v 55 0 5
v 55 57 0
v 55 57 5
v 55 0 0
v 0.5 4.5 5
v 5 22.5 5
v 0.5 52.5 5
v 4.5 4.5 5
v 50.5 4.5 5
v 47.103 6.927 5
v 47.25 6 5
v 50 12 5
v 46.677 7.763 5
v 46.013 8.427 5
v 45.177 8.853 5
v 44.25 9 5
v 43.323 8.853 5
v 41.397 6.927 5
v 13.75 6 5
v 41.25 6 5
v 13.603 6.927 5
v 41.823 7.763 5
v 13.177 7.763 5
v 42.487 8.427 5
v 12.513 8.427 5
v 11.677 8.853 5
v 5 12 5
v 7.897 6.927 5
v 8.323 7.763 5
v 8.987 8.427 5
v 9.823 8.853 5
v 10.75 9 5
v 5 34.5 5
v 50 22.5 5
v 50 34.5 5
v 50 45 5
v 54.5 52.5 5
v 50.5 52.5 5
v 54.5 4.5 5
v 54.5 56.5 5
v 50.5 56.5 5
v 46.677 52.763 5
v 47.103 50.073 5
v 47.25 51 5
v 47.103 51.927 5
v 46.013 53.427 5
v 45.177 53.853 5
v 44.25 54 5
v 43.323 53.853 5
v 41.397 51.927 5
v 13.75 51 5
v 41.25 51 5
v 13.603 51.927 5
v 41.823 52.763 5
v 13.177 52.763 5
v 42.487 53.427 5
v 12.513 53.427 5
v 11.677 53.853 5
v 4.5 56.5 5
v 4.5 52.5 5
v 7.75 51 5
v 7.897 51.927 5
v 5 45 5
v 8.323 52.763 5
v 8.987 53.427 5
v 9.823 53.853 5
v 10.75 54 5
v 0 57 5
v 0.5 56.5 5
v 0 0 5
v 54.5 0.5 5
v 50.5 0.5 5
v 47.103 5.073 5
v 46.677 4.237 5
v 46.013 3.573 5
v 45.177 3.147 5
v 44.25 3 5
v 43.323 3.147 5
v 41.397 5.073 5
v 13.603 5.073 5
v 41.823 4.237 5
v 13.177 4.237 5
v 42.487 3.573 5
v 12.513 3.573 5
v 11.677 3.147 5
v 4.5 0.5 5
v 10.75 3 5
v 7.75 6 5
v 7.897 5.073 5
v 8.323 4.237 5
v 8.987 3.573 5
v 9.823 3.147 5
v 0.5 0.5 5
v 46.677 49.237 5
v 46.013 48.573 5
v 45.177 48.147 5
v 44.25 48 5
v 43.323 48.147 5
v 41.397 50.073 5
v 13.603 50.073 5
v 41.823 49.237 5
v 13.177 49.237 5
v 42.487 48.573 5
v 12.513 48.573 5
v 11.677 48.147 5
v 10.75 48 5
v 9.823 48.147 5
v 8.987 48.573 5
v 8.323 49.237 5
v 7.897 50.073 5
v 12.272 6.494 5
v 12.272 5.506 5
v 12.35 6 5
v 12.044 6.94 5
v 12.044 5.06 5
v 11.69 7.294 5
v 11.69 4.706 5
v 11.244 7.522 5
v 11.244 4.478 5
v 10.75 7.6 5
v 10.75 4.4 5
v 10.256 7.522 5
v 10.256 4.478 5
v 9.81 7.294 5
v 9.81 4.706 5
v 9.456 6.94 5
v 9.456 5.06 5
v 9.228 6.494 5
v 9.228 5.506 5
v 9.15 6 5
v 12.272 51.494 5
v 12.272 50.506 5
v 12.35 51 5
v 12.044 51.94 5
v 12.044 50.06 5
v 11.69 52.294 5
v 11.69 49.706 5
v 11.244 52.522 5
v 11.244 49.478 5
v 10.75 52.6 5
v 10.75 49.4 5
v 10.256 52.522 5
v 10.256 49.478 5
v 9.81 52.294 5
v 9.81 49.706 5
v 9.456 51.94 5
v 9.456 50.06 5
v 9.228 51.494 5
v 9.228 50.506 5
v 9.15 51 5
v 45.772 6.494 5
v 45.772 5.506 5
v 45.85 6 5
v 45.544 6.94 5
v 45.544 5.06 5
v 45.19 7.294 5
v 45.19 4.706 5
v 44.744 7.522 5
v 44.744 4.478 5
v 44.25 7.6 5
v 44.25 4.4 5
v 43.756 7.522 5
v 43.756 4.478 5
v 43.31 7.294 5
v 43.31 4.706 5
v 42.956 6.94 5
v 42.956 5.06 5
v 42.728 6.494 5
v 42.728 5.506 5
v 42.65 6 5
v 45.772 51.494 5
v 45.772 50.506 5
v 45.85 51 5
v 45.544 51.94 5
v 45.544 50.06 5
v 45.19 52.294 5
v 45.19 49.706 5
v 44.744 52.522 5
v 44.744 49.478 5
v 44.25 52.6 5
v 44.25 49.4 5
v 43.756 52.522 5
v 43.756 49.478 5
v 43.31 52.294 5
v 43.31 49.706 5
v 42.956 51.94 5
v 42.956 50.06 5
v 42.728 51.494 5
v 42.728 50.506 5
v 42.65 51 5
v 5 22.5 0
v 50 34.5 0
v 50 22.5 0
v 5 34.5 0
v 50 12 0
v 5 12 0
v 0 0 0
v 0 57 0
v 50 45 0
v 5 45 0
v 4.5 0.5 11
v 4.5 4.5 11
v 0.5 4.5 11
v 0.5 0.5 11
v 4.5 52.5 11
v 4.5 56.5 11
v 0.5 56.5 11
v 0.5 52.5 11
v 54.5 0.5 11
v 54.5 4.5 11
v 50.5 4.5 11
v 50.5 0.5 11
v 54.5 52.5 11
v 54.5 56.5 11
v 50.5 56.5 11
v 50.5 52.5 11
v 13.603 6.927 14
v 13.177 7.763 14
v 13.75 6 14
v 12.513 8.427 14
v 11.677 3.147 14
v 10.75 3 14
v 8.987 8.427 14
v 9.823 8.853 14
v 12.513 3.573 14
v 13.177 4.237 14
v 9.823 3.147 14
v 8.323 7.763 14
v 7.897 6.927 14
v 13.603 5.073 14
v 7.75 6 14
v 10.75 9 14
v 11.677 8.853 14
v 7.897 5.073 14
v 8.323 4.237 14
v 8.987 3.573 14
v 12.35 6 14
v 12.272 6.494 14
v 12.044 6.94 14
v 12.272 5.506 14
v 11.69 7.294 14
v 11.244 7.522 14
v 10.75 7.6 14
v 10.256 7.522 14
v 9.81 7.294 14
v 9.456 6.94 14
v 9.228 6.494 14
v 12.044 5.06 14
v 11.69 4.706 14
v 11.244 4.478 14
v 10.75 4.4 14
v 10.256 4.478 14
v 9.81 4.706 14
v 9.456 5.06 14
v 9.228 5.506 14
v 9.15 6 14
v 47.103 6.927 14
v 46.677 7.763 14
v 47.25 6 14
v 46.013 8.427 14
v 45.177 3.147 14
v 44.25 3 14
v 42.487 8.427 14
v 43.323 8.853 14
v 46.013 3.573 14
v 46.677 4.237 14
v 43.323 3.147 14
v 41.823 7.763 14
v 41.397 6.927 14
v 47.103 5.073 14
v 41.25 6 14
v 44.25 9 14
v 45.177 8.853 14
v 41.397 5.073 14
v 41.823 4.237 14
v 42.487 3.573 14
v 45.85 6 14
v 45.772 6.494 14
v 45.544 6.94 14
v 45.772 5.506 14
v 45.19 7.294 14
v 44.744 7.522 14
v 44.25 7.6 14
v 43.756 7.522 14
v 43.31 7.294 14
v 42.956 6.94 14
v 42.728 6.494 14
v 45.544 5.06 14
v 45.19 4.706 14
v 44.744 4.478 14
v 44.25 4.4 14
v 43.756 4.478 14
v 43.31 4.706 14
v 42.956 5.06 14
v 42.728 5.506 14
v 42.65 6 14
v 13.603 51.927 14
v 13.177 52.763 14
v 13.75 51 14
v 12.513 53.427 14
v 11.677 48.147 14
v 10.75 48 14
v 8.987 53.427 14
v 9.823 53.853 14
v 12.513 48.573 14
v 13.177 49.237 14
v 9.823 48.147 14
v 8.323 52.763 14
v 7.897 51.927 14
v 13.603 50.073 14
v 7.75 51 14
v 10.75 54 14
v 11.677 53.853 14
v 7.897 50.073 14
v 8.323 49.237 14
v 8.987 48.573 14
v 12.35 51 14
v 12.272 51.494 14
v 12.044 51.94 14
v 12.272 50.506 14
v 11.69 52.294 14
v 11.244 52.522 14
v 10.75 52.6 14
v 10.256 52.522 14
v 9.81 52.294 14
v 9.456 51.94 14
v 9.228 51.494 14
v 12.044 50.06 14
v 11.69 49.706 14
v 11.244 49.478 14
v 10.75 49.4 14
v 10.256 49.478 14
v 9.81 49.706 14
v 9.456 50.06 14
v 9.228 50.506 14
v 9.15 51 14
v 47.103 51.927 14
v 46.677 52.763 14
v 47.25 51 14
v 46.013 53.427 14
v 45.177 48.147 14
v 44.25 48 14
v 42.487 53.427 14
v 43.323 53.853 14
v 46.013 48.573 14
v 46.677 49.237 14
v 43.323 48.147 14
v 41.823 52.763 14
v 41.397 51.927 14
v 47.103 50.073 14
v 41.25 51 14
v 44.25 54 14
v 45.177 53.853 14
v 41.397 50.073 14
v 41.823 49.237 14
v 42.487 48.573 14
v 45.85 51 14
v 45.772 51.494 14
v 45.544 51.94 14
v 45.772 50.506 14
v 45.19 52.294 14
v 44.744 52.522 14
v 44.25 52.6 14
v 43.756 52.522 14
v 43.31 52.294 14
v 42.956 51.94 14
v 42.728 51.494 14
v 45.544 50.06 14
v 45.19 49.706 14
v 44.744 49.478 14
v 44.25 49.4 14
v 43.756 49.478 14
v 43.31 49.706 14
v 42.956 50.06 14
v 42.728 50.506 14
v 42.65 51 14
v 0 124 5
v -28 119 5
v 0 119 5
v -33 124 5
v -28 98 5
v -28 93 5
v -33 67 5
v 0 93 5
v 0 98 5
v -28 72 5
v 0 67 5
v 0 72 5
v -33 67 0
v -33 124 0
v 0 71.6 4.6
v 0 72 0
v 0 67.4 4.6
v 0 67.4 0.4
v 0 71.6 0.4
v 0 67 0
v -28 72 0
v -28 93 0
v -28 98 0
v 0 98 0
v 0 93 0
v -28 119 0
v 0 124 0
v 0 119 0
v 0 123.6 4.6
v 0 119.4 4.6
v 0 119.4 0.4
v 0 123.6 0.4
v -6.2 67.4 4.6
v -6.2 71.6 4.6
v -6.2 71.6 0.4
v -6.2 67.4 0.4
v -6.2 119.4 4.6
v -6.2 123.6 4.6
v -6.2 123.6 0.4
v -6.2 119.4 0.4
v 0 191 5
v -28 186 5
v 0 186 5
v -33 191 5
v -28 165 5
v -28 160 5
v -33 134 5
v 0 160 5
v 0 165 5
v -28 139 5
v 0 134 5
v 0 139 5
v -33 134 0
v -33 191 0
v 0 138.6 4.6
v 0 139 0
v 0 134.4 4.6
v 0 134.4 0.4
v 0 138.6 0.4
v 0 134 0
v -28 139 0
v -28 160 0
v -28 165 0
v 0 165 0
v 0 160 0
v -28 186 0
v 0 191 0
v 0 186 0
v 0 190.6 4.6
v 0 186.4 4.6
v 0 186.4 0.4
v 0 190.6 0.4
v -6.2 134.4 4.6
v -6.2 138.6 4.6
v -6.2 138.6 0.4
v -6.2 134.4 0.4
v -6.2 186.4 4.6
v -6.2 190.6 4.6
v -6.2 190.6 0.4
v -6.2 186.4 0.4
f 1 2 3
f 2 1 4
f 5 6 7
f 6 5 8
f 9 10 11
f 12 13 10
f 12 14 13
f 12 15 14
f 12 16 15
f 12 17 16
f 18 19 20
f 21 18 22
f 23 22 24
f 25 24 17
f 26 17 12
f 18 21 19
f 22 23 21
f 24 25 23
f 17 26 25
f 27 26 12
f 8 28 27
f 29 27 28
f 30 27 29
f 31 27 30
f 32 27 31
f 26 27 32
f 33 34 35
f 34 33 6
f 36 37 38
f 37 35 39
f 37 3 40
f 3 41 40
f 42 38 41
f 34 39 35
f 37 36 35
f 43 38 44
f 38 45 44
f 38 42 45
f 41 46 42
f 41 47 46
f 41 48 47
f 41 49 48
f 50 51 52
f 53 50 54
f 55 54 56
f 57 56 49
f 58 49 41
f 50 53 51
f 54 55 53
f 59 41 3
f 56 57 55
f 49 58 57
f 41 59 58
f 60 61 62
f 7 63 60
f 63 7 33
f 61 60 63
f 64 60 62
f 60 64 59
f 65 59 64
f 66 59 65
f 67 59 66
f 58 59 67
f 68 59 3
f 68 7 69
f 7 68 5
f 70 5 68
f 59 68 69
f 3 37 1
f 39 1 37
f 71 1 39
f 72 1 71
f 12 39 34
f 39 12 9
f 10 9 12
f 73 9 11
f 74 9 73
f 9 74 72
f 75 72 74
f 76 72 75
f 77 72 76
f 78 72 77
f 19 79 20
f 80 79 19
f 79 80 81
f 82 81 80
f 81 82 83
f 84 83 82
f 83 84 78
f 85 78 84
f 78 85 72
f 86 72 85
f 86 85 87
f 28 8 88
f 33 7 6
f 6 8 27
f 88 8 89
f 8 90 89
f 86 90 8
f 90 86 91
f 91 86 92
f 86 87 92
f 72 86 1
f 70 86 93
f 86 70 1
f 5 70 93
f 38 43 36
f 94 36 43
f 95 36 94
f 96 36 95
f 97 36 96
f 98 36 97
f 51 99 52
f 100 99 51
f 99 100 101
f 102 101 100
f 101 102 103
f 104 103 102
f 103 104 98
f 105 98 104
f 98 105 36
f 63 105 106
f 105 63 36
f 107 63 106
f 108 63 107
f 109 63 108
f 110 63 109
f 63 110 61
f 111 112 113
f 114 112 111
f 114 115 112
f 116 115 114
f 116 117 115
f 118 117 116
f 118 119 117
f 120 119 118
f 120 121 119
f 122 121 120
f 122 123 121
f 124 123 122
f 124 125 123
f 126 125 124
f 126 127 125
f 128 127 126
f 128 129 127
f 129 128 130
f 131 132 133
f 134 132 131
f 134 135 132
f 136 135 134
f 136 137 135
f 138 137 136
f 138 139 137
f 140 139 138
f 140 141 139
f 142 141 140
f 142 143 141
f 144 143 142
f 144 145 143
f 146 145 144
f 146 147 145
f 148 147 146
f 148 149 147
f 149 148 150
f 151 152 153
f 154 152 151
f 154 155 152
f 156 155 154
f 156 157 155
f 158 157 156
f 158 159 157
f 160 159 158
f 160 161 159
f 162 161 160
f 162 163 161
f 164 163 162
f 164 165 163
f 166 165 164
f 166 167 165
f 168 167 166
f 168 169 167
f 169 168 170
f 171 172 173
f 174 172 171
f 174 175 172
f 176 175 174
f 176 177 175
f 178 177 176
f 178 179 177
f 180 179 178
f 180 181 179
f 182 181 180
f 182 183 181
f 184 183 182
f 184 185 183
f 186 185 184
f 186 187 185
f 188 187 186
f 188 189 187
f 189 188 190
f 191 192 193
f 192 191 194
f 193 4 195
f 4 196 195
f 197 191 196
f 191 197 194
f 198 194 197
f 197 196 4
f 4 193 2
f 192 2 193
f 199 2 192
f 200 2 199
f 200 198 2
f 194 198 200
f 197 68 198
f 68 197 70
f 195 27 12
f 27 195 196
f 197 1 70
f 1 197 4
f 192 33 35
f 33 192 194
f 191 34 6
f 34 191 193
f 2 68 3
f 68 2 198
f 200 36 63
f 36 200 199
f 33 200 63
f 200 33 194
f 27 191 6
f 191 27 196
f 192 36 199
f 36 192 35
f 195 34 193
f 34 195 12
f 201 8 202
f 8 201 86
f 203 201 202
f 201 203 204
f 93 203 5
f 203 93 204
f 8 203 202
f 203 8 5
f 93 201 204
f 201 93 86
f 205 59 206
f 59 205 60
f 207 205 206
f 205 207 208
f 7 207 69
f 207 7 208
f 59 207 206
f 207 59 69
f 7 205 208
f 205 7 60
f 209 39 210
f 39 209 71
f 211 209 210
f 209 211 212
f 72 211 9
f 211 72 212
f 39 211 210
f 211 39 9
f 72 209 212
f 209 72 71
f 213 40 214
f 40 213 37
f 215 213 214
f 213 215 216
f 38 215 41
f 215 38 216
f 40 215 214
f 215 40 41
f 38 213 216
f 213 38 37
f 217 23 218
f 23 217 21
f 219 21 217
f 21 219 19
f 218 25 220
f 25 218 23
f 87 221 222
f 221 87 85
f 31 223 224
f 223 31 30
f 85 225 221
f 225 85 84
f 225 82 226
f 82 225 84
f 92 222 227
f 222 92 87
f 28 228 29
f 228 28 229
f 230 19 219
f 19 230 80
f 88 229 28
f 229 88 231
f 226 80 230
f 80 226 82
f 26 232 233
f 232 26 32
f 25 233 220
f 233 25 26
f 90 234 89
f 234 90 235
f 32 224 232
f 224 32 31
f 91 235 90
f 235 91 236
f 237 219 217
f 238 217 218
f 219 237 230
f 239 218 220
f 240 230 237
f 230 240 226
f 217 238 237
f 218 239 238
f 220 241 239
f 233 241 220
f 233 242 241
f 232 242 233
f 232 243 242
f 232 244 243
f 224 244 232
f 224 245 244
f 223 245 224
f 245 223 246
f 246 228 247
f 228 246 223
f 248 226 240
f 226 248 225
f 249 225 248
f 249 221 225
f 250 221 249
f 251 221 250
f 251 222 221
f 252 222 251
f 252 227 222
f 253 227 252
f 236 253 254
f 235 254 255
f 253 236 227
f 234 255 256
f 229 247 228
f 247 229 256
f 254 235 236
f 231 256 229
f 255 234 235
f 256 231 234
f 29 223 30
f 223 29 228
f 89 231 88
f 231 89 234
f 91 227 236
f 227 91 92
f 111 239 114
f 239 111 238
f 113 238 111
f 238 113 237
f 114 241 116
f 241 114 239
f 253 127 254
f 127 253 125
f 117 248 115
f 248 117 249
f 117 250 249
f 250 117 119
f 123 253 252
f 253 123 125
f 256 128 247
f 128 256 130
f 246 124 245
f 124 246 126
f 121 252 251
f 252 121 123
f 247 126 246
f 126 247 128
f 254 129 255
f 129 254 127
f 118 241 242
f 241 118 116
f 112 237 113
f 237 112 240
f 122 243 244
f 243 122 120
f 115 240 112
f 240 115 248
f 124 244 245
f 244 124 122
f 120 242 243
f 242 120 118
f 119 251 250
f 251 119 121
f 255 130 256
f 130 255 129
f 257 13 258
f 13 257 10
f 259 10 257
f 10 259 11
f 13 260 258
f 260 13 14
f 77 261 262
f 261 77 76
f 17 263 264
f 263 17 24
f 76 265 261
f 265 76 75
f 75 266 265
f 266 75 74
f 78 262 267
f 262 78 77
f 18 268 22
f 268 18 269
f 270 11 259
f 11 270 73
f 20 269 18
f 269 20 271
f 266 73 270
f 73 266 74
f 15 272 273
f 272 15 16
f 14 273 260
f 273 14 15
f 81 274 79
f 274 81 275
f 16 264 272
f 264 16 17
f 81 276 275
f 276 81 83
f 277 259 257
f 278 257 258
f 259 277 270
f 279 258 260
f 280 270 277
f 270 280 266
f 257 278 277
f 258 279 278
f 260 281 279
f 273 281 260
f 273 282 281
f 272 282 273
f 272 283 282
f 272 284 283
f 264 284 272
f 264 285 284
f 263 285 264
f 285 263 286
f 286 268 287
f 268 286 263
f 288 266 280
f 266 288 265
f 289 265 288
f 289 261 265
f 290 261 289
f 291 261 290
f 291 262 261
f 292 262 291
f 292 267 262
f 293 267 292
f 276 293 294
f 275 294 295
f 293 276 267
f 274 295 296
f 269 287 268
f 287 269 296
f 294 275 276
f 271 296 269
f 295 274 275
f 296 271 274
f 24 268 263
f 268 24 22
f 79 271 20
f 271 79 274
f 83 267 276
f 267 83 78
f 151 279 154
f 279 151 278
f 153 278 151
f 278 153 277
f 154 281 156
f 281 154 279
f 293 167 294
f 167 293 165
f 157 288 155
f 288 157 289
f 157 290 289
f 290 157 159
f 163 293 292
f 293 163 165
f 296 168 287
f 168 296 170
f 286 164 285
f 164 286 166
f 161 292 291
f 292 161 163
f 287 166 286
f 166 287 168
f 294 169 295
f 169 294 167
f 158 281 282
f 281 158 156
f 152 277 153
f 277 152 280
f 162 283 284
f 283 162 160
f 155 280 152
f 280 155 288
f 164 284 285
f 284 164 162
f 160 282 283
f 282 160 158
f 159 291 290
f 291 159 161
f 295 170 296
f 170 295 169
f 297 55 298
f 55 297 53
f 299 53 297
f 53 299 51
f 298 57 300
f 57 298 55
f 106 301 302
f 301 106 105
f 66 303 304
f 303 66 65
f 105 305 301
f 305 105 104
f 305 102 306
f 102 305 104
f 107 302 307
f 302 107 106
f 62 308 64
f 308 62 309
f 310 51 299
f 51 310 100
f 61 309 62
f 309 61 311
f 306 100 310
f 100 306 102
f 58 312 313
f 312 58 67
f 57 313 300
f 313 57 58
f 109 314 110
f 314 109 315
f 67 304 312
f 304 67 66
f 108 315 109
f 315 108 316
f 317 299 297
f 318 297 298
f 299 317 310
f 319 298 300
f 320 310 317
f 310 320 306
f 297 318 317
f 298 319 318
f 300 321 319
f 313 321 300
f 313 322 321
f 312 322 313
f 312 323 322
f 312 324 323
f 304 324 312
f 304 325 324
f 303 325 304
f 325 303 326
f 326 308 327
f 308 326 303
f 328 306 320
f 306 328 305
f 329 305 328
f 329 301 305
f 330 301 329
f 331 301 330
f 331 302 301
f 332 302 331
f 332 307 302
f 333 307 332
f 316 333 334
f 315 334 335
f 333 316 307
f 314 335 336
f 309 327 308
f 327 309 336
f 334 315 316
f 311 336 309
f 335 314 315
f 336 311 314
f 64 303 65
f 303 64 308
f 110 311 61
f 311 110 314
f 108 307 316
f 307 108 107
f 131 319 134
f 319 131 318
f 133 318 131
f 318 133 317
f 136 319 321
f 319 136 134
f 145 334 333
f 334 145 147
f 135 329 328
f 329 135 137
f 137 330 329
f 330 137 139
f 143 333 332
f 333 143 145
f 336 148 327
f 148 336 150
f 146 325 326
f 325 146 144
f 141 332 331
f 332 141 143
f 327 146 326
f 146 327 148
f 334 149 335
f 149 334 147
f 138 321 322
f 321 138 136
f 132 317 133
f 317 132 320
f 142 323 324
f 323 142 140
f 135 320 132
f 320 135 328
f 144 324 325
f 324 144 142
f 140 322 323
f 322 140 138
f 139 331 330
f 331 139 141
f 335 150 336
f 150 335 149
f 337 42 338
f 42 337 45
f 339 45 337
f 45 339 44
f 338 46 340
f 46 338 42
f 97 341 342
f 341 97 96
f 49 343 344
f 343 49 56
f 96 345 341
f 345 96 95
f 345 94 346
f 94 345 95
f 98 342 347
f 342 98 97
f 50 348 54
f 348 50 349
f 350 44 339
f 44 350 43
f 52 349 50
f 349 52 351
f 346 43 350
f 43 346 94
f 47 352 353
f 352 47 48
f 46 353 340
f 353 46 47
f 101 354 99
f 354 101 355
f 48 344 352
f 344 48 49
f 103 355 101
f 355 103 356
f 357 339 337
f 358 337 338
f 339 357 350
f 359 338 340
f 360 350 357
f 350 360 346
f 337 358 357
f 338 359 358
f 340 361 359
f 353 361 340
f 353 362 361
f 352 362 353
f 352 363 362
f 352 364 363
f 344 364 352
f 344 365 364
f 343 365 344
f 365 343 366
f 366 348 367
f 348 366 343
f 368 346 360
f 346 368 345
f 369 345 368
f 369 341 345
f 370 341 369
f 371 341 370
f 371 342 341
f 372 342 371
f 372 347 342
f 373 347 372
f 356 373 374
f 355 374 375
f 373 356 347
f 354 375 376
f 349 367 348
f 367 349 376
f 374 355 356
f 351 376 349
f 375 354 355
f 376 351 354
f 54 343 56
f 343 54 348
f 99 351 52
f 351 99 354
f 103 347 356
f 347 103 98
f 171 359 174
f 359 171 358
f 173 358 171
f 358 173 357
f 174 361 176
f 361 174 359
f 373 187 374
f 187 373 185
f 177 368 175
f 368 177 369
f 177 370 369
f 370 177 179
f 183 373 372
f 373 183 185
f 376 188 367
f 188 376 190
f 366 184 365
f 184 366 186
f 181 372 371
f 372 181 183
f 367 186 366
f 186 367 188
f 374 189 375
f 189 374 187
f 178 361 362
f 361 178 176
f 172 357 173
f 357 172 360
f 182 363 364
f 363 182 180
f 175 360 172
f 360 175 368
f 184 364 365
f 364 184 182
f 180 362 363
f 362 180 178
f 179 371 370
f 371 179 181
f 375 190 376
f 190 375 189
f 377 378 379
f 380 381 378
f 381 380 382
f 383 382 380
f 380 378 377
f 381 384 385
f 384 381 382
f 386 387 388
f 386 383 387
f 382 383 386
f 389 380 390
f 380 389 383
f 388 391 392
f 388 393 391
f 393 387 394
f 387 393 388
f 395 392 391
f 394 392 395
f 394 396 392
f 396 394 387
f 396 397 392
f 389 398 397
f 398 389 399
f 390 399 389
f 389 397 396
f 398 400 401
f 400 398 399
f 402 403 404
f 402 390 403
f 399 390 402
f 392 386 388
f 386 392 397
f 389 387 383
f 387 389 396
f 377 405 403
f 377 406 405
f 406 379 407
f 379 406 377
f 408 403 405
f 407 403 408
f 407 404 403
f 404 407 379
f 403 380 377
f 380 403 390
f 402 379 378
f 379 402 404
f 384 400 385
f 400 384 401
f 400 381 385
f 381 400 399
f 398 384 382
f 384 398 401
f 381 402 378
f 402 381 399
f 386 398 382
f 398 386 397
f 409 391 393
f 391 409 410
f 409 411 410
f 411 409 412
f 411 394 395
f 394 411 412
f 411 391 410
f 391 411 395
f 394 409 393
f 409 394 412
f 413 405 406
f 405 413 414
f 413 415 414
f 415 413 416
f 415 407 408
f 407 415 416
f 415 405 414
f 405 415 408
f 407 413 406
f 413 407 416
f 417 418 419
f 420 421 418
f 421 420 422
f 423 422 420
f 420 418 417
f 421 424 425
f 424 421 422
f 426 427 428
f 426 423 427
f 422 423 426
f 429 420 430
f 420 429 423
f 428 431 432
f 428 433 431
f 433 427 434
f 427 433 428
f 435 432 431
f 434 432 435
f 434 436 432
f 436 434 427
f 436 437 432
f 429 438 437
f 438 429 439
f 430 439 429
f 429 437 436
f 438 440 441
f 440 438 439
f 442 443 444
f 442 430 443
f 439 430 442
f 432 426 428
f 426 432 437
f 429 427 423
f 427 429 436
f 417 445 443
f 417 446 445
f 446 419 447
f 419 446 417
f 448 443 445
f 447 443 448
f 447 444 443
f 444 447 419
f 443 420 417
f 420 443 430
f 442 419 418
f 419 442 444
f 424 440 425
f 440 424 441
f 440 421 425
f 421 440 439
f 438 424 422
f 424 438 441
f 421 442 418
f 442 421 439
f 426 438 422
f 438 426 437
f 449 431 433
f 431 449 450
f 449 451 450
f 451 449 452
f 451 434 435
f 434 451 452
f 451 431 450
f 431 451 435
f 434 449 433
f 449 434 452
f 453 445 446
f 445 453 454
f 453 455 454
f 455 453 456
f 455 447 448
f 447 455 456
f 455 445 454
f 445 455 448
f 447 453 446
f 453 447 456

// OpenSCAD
// Neato XV Signature Pro - Inner Left Pod PRINT FILE
// All parts in one file — base + both side walls — for a single print job.
// Base prints flat (ribbed face down). Sides lay flat on outer face.
// No supports needed.
//
// ASSEMBLY: press side wall posts into base bosses after printing.

// ============================================================
// PARAMETERS
// ============================================================

pod_width  = 55;
pod_depth  = 57;
pod_height = 66;

rail_w = 5;
rib_w  = 12;
wall_h = pod_height / 2;  // ~33mm half height

standoff_h    = 9;
standoff_od   = 6;
standoff_hole = 3.2; // M3 for relay

boss_size  = 4;
boss_h     = 6;

socket_size  = 4.2;
socket_depth = 6.2;

relay_hole_x_span = 33.5;
relay_hole_y_span = 45.0;

relay_x_left  = (pod_width - relay_hole_x_span) / 2;
relay_x_right = relay_x_left + relay_hole_x_span;

relay_y_front = (pod_depth - relay_hole_y_span) / 2;
relay_y_rear  = relay_y_front + relay_hole_y_span;
relay_y_mid   = (relay_y_front + relay_y_rear) / 2;

rib_positions = [relay_y_front, relay_y_mid, relay_y_rear];

relay_holes = [
    [relay_x_left,  relay_y_front],
    [relay_x_right, relay_y_front],
    [relay_x_left,  relay_y_rear ],
    [relay_x_right, relay_y_rear ],
];

boss_locations = [
    [rail_w/2,             rail_w/2             ],
    [rail_w/2,             pod_depth - rail_w/2 ],
    [pod_width - rail_w/2, rail_w/2             ],
    [pod_width - rail_w/2, pod_depth - rail_w/2 ],
];

// ============================================================
// MODULES
// ============================================================

module socket() {
    translate([-socket_size/2, -socket_size/2, 0])
        cube([socket_size, socket_size, socket_depth]);
}

module ribbed_bottom() {
    cube([rail_w, pod_depth, rail_w]);
    translate([pod_width - rail_w, 0, 0])
        cube([rail_w, pod_depth, rail_w]);
    cube([pod_width, rail_w, rail_w]);
    translate([0, pod_depth - rail_w, 0])
        cube([pod_width, rail_w, rail_w]);
    for (y_center = rib_positions) {
        translate([0, y_center - rib_w / 2, 0])
            cube([pod_width, rib_w, rail_w]);
    }
}

module standoff(h, hole_d) {
    difference() {
        cylinder(h=h, d=standoff_od, $fn=20);
        cylinder(h=h + 0.1, d=hole_d, $fn=20);
    }
}

module side() {
    difference() {
        union() {
            cube([rail_w, rail_w, wall_h]);
            translate([0, pod_depth - rail_w, 0])
                cube([rail_w, rail_w, wall_h]);
            translate([0, pod_depth / 2 - rail_w / 2, 0])
                cube([rail_w, rail_w, wall_h]);
            translate([0, 0, wall_h - rail_w])
                cube([rail_w, pod_depth, rail_w]);
        }
        translate([rail_w/2, rail_w/2, 0])             socket();
        translate([rail_w/2, pod_depth - rail_w/2, 0]) socket();
    }
}

// ============================================================
// MAIN — base + two sides laid out flat on bed
// ============================================================

// Base — flat, ribbed face down
union() {
    ribbed_bottom();
    for (b = boss_locations) {
        translate([b[0] - boss_size/2, b[1] - boss_size/2, rail_w])
            cube([boss_size, boss_size, boss_h]);
    }
    for (h = relay_holes) {
        translate([h[0], h[1], rail_w])
            standoff(standoff_h, standoff_hole);
    }
}

// Left side — flat on bed, offset in Y from base
translate([0, pod_depth + 10, 0])
rotate([0, -90, 0])
side();

// Right side — flat on bed, offset further in Y
translate([0, pod_depth * 2 + 20, 0])
rotate([0, -90, 0])
side();
